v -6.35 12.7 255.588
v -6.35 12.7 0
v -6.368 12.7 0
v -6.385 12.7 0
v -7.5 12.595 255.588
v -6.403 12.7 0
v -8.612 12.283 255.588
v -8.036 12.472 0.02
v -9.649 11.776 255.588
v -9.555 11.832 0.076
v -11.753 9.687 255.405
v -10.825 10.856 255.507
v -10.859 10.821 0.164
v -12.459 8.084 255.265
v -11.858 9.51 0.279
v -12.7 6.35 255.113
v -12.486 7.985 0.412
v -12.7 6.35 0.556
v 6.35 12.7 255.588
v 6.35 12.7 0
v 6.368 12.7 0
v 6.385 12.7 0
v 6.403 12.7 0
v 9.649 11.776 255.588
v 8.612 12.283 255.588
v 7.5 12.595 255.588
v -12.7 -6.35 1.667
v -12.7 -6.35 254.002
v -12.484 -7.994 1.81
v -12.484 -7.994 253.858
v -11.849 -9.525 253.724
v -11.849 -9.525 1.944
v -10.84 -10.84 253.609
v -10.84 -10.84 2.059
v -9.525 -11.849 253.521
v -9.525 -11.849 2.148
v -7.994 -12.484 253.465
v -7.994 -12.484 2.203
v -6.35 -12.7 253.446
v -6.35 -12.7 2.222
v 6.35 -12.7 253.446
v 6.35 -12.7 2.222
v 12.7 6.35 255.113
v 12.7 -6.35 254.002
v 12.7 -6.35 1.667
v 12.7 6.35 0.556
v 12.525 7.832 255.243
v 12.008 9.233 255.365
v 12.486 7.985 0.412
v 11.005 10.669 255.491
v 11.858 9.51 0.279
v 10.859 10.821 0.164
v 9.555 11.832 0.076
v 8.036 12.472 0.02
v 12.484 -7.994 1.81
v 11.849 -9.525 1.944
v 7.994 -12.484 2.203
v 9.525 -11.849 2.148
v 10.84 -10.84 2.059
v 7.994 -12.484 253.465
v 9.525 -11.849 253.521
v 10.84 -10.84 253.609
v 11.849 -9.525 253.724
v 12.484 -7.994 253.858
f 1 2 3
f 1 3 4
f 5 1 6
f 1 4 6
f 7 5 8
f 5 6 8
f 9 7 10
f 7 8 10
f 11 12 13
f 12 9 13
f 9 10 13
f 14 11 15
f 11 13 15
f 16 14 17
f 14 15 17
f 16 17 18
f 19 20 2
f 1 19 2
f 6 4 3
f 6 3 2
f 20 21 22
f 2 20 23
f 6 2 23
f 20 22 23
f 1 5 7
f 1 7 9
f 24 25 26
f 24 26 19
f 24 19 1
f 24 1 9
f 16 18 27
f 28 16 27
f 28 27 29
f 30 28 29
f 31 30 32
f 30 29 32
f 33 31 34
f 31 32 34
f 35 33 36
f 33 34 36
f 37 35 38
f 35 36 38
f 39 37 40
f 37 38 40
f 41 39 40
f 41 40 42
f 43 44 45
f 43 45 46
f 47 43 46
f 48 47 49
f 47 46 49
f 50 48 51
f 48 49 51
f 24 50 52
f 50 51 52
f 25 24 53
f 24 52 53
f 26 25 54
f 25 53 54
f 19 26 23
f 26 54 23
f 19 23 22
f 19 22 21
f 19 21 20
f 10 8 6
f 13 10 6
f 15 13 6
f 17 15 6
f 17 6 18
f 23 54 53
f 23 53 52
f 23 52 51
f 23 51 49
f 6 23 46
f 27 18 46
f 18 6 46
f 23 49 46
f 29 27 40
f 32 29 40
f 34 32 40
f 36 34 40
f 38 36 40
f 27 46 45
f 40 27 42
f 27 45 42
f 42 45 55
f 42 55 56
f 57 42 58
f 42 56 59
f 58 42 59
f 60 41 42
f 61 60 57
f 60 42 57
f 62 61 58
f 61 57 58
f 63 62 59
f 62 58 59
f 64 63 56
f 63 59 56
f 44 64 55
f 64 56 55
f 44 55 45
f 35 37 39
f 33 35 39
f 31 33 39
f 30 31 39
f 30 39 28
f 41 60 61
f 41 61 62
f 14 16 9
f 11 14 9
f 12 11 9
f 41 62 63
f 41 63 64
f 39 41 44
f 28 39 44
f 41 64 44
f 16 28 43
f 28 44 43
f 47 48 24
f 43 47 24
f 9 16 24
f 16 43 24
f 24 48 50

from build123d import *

# Parameters (mm, degrees)
F1_DEPTH = 255.5875
F3_DEPTH = 12.7
F5_DEPTH = 12.7


with BuildPart() as f1:
    # F0 (on Top) → F1 (new body)
    with BuildSketch(Plane.XY):
        with BuildLine():
            ThreePointArc((12.7, 6.35), (10.840128, 10.840128), (6.35, 12.7))
            Line((6.35, 12.7), (-6.35, 12.7))
            ThreePointArc((-6.35, 12.7), (-10.840128, 10.840128), (-12.7, 6.35))
            Line((-12.7, 6.35), (-12.7, -6.35))
            ThreePointArc((-12.7, -6.35), (-10.840128, -10.840128), (-6.35, -12.7))
            Line((-6.35, -12.7), (6.35, -12.7))
            ThreePointArc((6.35, -12.7), (10.840128, -10.840128), (12.7, -6.35))
            Line((12.7, -6.35), (12.7, 6.35))
        make_face()
    extrude(amount=F1_DEPTH)

    # F2 (on Right) → F3 (cut, symmetric)
    with BuildSketch(Plane.YZ):
        Polygon((-17.71266, 0), (12.69978, 0), (-17.71266, 2.660744), align=None)
    extrude(amount=F3_DEPTH, both=True, mode=Mode.SUBTRACT)

    # F4 (on Right) → F5 (cut, symmetric)
    with BuildSketch(Plane.YZ):
        Polygon((-13.445419, 253.380933), (13.181062, 255.710448), (-13.445419, 255.710448), align=None)
    extrude(amount=F5_DEPTH, both=True, mode=Mode.SUBTRACT)


solid = f1.part
